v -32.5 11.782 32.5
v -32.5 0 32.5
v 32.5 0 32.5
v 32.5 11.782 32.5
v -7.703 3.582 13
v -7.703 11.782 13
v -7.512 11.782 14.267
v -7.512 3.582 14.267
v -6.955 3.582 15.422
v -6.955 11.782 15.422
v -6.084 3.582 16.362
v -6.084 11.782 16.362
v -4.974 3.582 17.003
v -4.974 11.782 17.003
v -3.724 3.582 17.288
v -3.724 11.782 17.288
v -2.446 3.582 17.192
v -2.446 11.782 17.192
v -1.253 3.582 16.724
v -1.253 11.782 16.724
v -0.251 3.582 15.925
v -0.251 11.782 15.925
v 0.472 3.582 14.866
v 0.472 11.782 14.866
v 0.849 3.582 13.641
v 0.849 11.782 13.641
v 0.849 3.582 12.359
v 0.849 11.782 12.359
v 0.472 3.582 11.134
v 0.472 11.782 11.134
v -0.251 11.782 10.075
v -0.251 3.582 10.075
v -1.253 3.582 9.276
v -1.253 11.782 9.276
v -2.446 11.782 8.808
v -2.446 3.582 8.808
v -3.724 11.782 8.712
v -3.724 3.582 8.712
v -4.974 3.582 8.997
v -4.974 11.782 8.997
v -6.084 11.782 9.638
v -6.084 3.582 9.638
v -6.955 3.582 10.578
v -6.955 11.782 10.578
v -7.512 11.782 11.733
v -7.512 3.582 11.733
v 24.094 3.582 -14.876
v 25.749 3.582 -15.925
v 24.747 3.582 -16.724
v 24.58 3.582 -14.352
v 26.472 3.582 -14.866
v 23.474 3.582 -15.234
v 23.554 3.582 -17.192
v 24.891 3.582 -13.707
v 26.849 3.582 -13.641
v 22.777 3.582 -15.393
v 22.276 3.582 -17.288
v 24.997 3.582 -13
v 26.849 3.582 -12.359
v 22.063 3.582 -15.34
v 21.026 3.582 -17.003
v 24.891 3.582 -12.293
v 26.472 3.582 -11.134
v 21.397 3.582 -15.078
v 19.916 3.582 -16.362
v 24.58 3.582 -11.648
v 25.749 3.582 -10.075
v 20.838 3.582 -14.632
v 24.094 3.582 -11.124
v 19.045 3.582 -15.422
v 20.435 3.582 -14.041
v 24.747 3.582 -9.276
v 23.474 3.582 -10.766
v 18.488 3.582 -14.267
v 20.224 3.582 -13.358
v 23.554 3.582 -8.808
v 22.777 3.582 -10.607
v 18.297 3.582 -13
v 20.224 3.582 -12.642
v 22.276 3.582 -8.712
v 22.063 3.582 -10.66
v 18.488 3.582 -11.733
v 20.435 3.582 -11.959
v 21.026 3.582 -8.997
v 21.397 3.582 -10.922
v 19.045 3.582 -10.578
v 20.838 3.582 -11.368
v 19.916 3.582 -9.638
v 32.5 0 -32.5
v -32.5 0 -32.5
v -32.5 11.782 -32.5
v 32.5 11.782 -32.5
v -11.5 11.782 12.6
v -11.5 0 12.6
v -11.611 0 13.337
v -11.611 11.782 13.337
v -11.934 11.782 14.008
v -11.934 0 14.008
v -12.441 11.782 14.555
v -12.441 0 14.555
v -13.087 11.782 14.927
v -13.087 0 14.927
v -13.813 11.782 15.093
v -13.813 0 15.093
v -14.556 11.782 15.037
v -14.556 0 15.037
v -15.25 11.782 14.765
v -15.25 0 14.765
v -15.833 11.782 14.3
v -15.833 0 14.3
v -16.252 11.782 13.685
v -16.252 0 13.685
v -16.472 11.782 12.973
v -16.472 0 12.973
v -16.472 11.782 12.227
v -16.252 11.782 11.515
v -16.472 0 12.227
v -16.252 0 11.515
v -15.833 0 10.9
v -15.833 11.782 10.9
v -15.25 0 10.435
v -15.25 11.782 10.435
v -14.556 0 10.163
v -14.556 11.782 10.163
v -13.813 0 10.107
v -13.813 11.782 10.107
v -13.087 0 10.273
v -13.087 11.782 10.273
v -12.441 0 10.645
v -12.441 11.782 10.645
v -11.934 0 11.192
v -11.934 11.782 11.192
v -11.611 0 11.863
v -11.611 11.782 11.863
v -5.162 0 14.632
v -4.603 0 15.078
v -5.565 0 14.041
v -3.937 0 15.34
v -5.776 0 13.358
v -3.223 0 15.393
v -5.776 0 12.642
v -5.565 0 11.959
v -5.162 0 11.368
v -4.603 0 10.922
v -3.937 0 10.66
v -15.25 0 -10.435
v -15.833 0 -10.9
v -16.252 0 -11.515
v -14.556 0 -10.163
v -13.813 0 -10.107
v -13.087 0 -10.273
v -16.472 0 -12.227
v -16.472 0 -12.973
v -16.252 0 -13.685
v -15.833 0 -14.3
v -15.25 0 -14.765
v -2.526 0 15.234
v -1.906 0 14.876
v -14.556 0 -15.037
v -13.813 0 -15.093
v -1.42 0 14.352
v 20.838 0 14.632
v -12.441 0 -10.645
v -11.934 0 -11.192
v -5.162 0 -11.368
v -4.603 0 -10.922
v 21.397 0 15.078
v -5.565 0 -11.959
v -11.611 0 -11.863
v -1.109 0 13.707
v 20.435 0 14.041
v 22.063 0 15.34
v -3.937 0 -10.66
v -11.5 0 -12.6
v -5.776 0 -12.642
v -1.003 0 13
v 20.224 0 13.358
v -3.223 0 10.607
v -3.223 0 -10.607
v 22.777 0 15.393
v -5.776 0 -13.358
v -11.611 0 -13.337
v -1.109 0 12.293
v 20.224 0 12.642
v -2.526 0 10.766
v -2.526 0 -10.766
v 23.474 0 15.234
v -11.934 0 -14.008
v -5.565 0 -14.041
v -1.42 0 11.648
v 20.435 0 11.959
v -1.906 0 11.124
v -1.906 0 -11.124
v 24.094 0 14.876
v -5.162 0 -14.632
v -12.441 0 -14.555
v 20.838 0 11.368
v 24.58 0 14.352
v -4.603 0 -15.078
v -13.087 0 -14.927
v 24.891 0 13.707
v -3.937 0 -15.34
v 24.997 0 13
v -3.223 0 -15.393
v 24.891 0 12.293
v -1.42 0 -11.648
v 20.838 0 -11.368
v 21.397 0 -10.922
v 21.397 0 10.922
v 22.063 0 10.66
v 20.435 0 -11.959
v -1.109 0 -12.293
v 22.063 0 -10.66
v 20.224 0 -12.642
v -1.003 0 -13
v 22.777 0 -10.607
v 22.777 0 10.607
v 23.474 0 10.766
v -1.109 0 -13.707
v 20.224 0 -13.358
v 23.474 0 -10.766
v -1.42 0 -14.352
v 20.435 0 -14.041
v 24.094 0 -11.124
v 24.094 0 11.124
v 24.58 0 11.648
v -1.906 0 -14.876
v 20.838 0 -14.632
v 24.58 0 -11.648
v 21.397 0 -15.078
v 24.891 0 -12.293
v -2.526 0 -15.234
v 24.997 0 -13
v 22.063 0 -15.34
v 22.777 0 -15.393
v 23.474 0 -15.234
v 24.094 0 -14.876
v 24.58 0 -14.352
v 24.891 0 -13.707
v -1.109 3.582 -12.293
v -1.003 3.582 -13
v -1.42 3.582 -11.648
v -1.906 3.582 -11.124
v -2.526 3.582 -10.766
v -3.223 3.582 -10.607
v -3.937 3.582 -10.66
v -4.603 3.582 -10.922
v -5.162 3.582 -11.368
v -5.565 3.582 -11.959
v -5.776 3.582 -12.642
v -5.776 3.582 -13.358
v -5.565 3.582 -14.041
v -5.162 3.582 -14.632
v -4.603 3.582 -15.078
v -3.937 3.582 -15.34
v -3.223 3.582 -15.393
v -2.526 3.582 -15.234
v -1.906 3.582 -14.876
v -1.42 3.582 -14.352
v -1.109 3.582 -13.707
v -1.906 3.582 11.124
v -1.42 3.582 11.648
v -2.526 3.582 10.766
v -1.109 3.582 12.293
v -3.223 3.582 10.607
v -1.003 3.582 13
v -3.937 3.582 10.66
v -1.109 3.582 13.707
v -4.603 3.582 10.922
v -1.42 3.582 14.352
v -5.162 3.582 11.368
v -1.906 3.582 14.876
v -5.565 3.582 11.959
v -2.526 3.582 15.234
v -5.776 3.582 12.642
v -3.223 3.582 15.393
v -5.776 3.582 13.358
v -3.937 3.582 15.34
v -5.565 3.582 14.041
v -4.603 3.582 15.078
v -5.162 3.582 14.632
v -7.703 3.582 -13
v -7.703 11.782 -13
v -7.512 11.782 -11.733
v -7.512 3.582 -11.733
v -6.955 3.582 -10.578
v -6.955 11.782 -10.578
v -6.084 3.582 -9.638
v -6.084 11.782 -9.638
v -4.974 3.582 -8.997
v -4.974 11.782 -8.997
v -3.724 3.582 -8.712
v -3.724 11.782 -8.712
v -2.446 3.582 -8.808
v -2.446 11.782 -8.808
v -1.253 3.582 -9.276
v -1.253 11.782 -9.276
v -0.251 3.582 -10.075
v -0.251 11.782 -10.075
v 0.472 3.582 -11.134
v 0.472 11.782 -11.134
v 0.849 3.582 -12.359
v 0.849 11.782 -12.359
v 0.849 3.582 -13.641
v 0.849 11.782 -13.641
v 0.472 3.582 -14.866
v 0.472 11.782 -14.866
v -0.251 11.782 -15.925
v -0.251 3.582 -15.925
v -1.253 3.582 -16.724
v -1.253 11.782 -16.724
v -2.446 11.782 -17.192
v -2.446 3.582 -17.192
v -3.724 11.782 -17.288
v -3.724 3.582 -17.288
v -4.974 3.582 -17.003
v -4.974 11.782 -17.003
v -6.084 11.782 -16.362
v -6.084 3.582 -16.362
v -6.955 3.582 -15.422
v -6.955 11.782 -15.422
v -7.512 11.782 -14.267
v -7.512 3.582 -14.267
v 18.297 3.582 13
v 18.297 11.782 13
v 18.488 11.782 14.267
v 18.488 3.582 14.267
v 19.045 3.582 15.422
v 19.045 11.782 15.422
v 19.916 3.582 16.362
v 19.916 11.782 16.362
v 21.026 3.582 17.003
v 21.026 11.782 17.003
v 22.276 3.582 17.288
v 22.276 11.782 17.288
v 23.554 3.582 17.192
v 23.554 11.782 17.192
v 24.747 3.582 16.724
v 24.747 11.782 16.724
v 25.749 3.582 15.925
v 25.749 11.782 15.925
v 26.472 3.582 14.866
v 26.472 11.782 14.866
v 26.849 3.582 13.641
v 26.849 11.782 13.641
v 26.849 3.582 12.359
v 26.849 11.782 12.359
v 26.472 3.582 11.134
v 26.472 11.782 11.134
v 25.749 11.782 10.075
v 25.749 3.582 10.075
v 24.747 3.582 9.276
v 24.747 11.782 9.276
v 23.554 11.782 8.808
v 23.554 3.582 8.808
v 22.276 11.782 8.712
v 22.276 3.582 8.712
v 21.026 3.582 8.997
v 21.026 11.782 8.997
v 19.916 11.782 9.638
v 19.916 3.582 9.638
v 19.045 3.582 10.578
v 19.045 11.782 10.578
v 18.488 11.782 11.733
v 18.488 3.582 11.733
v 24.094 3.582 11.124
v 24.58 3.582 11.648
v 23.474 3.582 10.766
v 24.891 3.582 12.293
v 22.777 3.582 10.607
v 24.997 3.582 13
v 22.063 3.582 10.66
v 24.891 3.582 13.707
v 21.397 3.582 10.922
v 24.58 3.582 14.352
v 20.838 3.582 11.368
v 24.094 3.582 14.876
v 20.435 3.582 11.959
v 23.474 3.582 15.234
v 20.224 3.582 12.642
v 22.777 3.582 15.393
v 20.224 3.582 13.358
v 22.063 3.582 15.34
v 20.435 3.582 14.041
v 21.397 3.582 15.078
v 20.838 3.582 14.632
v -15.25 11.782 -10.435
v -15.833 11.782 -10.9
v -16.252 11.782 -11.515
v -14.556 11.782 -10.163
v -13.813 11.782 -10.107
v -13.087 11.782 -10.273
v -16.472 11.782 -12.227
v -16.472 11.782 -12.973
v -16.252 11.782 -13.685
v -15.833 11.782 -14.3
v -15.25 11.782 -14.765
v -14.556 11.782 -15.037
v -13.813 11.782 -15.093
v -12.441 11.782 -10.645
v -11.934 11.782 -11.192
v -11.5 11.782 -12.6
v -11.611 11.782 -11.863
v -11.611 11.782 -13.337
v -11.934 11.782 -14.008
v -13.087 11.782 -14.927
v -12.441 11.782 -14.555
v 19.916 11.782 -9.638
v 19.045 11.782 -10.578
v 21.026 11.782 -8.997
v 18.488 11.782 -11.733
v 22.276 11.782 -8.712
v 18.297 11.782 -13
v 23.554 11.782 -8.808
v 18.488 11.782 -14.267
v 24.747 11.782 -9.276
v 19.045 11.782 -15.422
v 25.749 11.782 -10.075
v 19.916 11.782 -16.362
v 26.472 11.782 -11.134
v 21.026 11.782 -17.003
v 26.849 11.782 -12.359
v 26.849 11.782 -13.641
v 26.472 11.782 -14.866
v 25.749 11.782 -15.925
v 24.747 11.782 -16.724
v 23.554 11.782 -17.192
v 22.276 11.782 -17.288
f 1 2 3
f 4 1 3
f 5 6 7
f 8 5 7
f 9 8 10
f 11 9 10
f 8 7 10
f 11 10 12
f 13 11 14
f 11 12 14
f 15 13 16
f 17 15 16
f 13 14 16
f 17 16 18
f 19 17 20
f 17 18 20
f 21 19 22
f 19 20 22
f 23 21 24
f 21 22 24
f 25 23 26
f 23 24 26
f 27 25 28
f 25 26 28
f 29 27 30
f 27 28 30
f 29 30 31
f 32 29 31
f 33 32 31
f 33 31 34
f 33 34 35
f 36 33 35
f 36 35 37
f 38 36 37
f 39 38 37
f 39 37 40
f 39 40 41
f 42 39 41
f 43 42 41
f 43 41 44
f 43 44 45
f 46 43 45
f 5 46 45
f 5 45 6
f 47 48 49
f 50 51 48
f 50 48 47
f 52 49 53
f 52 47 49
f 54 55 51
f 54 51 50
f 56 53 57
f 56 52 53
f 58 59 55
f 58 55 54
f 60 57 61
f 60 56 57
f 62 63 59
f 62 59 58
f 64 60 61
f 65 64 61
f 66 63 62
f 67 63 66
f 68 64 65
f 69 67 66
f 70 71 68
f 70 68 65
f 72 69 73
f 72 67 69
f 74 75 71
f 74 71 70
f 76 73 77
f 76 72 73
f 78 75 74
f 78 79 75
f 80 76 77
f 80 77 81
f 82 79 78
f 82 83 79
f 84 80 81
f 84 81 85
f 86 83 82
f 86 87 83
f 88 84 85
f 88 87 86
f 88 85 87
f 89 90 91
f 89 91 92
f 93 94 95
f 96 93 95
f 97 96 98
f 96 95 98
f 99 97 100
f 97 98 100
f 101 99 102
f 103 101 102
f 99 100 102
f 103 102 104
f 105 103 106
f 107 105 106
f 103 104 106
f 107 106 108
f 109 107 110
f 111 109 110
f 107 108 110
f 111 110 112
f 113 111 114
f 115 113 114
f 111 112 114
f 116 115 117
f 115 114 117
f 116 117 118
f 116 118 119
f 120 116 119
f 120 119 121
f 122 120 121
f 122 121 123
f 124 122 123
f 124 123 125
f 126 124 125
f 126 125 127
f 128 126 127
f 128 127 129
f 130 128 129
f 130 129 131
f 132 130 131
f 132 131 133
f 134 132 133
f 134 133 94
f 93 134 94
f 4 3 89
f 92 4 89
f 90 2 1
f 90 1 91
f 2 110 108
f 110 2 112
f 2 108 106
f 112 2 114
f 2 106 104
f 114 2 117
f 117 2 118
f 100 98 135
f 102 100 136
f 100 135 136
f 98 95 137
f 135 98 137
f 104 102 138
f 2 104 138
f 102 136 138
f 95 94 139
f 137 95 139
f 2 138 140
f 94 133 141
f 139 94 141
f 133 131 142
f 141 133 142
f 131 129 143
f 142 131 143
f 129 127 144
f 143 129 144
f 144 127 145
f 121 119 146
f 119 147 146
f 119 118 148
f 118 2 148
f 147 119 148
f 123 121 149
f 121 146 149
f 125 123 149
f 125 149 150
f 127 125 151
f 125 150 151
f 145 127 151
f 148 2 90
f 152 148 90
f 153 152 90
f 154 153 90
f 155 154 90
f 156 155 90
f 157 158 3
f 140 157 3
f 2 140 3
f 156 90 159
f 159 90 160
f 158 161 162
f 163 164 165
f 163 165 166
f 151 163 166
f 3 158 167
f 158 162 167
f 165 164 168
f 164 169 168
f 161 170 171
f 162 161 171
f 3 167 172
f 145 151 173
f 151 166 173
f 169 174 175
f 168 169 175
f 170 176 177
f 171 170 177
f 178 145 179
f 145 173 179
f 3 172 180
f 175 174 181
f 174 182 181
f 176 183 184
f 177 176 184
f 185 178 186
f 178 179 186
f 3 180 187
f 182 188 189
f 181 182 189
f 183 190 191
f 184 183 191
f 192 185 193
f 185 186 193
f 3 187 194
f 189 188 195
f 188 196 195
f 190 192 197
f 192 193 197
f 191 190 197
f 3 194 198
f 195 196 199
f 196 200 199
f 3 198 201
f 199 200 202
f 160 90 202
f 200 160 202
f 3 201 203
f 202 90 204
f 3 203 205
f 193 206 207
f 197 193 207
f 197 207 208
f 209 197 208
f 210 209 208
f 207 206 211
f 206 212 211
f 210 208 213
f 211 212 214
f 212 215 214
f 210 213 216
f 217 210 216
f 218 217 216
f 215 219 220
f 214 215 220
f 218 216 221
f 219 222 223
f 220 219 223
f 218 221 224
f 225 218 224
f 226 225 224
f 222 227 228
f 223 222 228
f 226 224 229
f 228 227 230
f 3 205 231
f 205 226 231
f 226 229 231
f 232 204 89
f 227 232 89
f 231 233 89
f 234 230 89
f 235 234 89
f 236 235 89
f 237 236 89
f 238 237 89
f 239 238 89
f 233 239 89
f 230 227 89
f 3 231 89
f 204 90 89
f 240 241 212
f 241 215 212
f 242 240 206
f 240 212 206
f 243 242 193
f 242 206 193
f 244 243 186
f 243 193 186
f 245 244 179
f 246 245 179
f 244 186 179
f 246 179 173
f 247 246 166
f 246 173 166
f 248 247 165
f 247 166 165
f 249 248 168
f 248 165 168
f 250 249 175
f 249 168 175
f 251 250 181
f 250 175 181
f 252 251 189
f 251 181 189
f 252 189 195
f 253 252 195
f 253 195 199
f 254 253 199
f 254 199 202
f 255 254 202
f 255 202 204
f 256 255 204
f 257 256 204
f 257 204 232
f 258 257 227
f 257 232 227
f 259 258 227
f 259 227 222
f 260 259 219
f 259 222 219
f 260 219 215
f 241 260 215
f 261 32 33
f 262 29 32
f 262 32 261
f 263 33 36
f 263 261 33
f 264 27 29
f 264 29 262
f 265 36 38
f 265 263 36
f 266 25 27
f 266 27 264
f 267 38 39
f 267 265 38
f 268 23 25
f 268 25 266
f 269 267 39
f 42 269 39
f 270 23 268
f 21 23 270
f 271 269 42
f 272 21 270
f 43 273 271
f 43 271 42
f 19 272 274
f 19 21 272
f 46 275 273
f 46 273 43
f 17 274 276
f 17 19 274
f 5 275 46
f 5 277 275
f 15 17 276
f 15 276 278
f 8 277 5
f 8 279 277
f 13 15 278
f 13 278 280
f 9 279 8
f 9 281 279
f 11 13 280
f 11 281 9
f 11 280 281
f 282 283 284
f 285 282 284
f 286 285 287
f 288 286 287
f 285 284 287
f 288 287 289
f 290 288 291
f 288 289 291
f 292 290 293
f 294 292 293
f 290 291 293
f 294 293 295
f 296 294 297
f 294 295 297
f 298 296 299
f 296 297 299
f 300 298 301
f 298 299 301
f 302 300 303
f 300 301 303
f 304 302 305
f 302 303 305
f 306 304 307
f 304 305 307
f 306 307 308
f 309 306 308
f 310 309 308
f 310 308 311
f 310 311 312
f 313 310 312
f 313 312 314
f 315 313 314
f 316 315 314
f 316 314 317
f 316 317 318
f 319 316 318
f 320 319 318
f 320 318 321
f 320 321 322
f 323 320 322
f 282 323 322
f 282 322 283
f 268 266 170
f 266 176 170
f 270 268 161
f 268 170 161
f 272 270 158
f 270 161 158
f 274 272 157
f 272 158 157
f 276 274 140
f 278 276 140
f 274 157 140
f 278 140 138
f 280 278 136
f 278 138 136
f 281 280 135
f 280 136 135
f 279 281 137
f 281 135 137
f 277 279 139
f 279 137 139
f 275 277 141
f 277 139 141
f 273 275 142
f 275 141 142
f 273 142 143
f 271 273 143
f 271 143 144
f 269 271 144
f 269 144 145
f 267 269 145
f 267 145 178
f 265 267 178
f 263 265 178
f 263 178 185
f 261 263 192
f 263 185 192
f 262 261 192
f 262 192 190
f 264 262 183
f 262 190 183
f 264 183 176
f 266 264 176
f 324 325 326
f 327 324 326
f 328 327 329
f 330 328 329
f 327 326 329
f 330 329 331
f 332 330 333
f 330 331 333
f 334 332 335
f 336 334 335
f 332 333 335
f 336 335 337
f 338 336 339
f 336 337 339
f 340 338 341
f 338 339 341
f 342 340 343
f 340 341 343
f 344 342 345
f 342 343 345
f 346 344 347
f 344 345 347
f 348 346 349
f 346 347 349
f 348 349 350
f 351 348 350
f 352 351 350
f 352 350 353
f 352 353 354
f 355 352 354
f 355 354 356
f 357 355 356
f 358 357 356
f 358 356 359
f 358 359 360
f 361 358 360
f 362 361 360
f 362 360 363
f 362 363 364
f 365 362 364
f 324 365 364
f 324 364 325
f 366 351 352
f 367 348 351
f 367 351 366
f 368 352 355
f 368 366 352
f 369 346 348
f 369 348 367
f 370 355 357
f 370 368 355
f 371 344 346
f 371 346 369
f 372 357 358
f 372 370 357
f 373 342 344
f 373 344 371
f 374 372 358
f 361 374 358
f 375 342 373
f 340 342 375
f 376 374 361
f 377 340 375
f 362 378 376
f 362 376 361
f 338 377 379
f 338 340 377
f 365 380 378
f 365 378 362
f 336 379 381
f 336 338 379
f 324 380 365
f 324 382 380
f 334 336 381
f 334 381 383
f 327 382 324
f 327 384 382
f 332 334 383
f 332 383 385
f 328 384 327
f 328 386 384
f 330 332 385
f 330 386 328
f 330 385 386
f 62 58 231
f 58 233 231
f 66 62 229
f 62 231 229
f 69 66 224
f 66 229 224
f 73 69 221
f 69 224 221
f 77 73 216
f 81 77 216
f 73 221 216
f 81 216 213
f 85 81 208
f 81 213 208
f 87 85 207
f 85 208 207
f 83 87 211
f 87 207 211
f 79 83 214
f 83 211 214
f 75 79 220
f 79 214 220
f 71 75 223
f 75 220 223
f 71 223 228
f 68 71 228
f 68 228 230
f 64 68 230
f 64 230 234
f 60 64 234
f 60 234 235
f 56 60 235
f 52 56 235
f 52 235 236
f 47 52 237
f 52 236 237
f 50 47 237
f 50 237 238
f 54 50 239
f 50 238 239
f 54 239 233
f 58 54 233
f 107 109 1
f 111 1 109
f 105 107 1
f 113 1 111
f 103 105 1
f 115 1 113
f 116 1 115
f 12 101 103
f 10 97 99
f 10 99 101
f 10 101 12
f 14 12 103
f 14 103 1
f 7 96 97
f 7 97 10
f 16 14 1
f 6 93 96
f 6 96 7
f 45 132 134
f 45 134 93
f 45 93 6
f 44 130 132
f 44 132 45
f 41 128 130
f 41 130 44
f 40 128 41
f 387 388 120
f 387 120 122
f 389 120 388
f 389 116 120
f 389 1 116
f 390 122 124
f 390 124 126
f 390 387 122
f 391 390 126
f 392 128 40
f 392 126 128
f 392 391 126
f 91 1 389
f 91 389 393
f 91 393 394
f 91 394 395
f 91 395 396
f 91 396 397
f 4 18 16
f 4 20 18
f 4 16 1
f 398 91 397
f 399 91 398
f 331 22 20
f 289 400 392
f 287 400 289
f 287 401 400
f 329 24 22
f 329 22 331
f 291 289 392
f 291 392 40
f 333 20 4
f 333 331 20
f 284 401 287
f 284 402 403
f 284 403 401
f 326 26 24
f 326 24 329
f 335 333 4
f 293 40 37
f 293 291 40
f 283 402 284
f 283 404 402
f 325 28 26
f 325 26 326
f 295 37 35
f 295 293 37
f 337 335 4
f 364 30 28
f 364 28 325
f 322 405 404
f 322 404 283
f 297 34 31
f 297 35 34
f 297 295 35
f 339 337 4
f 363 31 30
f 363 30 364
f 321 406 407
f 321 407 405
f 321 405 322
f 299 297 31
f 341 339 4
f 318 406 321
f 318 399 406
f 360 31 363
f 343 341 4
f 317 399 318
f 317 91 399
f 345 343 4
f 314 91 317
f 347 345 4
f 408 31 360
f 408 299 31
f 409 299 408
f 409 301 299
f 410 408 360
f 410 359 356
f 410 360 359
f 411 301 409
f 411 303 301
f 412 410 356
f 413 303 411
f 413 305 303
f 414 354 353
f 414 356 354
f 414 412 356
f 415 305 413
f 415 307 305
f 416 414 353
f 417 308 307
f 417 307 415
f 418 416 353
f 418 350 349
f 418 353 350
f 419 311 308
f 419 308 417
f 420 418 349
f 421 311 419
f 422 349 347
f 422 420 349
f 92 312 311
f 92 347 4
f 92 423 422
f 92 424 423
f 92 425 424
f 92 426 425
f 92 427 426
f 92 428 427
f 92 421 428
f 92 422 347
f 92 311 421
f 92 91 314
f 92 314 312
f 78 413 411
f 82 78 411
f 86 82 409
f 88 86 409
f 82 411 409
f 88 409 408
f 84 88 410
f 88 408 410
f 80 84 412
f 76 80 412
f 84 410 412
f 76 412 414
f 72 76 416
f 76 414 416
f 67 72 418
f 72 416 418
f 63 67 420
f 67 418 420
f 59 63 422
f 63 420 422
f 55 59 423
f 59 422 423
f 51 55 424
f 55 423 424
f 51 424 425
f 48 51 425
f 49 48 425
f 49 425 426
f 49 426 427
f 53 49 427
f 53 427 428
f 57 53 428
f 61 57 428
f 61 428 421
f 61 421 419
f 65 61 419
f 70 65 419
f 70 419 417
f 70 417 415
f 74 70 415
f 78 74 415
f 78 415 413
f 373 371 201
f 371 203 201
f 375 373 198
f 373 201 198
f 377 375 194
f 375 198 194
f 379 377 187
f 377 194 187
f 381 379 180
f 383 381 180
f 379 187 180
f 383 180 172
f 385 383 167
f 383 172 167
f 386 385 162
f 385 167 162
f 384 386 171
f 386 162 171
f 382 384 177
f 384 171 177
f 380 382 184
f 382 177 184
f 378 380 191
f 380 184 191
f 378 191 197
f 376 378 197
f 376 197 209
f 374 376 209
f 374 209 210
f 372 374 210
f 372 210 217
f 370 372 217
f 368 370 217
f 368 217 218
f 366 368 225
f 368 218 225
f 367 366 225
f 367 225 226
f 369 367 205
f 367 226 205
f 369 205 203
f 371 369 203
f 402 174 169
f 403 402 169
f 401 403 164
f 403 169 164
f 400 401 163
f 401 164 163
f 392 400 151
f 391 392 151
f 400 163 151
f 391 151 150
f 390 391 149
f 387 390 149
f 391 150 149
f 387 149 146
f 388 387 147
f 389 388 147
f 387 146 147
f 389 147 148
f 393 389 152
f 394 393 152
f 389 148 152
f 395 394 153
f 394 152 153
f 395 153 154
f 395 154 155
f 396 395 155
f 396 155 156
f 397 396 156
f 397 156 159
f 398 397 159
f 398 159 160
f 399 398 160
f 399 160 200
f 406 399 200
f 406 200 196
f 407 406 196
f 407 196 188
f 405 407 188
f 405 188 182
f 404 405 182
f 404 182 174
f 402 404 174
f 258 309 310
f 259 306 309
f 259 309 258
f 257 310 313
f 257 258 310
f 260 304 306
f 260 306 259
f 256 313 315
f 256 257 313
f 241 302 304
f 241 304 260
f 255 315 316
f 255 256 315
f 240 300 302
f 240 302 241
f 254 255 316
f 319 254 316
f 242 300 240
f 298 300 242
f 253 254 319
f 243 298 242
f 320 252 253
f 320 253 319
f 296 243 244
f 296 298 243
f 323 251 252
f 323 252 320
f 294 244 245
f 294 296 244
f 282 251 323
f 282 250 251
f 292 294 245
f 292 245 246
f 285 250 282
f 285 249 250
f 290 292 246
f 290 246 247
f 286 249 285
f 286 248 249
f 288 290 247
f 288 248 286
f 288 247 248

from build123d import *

# Parameters (mm, degrees)
SKETCH1_W                       = 65
SKETCH1_H                       = 65
EXTRUDE1_DEPTH                  = 11.7824246
M6X1_0_TAPPED_HOLE1_D           = 5
CBORE_FOR_M4_SBHCS1_D           = 4.8
CBORE_FOR_M4_SBHCS1_CBORE_D     = 8.6
CBORE_FOR_M4_SBHCS1_CBORE_DEPTH = 8.2


with BuildPart() as part:
    # Sketch1 → Extrude1 (new body)
    with BuildSketch(Plane(origin=(0, 0, 0), x_dir=(1, 0, 0), z_dir=(0, 1, 0))):
        Rectangle(SKETCH1_W, SKETCH1_H)
    extrude(amount=EXTRUDE1_DEPTH)

    # M6x1.0 Tapped Hole1 (through all)
    with Locations(Plane(origin=(0, 11.7824246, 0), x_dir=(-1, 0, 0), z_dir=(0, 1, 0))):
        with Locations((14, -12.6), (14, 12.6)):
            Hole(M6X1_0_TAPPED_HOLE1_D / 2)

    # CBORE for M4 SBHCS1 (through all)
    with Locations(Plane(origin=(0, 11.7824246, 0), x_dir=(-1, 0, 0), z_dir=(0, 1, 0))):
        with Locations((3.402638838, 13), (-22.597361162, 13), (-22.597361162, -13), (3.402638838, -13)):
            CounterBoreHole(CBORE_FOR_M4_SBHCS1_D / 2, CBORE_FOR_M4_SBHCS1_CBORE_D / 2, CBORE_FOR_M4_SBHCS1_CBORE_DEPTH)


solid = part.part
